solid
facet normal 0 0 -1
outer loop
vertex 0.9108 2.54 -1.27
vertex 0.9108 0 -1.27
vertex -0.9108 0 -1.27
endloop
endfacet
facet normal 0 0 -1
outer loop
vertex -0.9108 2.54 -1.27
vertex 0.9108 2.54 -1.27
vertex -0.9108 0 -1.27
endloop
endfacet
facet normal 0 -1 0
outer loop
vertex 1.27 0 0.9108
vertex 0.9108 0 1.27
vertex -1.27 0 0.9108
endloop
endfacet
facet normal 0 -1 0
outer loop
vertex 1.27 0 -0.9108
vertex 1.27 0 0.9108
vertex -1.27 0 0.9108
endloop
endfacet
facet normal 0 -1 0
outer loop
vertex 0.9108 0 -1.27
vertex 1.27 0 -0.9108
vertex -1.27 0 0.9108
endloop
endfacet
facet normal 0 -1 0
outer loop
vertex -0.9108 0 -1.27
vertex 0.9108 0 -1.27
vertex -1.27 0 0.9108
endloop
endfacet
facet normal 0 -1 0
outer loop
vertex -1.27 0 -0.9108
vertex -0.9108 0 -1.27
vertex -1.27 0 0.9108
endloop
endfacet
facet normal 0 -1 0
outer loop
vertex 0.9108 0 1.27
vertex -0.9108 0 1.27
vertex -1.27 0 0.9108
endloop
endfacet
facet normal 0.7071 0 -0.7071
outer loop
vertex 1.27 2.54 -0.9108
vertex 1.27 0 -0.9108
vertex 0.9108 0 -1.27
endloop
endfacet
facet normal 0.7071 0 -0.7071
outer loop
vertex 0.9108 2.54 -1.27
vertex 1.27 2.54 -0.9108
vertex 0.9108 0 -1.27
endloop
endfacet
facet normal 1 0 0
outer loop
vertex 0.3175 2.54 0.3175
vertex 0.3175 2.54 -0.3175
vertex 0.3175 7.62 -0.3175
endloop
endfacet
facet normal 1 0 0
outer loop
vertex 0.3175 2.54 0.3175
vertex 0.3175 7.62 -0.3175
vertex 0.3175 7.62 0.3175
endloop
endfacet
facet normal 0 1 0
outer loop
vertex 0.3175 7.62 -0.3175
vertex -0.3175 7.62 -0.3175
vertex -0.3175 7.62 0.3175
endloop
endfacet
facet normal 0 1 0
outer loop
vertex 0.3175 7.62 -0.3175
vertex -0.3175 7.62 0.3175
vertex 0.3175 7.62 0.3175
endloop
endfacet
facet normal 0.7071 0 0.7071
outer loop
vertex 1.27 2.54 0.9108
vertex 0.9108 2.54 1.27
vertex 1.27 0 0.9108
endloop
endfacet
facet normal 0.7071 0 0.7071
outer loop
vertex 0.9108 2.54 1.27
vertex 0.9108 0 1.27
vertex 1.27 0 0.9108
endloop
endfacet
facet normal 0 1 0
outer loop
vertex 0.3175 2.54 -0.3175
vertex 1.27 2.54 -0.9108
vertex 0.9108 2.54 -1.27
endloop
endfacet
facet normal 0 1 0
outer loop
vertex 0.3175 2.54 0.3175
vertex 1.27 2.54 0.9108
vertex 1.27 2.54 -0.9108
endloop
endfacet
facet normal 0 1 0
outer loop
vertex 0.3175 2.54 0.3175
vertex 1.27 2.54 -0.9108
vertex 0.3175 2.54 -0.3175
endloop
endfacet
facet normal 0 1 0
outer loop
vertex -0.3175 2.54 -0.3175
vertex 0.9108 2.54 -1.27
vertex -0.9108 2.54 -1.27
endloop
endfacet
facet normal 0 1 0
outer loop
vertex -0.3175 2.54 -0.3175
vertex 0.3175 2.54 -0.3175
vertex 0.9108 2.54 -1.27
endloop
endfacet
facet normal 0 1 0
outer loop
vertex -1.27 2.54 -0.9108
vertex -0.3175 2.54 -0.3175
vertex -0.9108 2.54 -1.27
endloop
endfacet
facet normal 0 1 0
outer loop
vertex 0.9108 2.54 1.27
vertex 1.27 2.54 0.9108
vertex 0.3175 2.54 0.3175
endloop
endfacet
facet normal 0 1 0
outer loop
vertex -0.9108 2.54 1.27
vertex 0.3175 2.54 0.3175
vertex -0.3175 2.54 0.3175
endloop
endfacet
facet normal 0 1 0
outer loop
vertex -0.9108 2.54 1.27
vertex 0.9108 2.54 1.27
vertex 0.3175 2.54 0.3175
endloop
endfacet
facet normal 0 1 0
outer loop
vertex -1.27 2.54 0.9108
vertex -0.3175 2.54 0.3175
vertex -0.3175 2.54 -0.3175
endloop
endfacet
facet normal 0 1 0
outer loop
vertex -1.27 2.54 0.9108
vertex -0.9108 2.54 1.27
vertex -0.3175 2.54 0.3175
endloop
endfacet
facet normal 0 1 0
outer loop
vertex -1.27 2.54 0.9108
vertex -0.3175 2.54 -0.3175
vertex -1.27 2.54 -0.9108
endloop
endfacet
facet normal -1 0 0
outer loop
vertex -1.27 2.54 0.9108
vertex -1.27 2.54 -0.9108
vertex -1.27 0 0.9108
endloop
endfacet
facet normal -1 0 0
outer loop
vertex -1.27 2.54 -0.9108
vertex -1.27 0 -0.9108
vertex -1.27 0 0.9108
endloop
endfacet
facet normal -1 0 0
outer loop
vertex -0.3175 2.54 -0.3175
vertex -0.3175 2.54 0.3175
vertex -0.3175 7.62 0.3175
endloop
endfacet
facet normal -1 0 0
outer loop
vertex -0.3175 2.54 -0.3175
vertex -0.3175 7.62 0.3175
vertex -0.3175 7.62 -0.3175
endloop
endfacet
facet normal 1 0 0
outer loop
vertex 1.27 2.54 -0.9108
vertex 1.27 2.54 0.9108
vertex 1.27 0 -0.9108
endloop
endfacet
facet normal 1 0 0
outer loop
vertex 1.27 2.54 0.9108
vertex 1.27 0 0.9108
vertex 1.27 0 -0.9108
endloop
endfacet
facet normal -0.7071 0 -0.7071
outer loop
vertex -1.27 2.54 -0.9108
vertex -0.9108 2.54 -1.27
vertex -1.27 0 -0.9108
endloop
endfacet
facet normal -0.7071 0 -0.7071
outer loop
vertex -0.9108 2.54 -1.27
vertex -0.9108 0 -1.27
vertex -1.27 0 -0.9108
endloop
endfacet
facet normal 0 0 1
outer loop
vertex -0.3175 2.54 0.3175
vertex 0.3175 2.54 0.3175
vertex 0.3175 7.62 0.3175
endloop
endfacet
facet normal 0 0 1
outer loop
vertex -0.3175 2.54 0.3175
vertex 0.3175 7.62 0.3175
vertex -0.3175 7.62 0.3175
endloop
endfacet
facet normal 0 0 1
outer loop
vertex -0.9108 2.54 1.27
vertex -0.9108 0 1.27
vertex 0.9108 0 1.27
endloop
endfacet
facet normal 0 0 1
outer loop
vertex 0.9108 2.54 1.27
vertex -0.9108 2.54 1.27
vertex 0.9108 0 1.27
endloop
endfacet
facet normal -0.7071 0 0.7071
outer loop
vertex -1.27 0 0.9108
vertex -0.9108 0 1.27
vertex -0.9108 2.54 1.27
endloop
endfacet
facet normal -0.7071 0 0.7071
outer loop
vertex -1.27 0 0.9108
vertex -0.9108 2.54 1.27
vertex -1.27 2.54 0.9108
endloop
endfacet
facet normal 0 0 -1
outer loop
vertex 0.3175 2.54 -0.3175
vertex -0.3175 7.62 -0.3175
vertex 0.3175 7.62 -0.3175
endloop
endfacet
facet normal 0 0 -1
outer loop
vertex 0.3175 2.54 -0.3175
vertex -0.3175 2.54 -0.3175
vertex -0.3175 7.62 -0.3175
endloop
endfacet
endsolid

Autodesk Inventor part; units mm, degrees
ref_plane "YZ Plane" through (0, 0, 0) normal (1, 0, 0) x (0, 1, 0)
ref_plane "XZ Plane" through (0, 0, 0) normal (0, 1, 0) x (-1, 0, 0)
ref_plane "XY Plane" through (0, 0, 0) normal (0, 0, 1) x (1, 0, 0)
sketch "Sketch1" plane through (0, 0, 0) normal (0, 1, 0) x (-1, 0, 0)
  line L0 (0.9108, 1.27) -> (-0.9108, 1.27)
  line L1 (-0.9108, 1.27) -> (-1.27, 0.9108)
  line L2 (-1.27, 0.9108) -> (-1.27, -0.9108)
  line L3 (0.9108, -1.27) -> (1.27, -0.9108)
  line L4 (1.27, -0.9108) -> (1.27, 0.9108)
  line L5 (0.9108, 1.27) -> (1.27, 0.9108)
  line L6 (-1.27, -0.9108) -> (-0.9108, -1.27)
  line L7 (-0.9108, -1.27) -> (0.9108, -1.27)
  line L8 (-1.27, 0) -> (1.27, 0) construction
  point P0 (0, 0)
  point P1 (0, 0)
  dimension "d1" = 2.54
  dimension "d3" = 0.508
  dimension "d4" = 135
extrude "Extrusion1" add sketch "Sketch1" along normal blind 2.54
sketch "Sketch2" plane through (0, 2.54, 0) normal (0, 1, 0) x (1, 0, 0)
  line L0 (-0.3175, 0.3175) -> (0.3175, 0.3175)
  line L1 (0.3175, 0.3175) -> (0.3175, -0.3175)
  line L2 (0.3175, -0.3175) -> (-0.3175, -0.3175)
  line L3 (-0.3175, -0.3175) -> (-0.3175, 0.3175)
  line L4 (-0.3175, 0.3175) -> (0.3175, -0.3175) construction
  point P0 (0, 0)
  point P1 (0, 0)
  dimension "d7" = 0.635
extrude "Extrusion2" add sketch "Sketch2" along normal blind 5.08
properties part number "Header1x1"
